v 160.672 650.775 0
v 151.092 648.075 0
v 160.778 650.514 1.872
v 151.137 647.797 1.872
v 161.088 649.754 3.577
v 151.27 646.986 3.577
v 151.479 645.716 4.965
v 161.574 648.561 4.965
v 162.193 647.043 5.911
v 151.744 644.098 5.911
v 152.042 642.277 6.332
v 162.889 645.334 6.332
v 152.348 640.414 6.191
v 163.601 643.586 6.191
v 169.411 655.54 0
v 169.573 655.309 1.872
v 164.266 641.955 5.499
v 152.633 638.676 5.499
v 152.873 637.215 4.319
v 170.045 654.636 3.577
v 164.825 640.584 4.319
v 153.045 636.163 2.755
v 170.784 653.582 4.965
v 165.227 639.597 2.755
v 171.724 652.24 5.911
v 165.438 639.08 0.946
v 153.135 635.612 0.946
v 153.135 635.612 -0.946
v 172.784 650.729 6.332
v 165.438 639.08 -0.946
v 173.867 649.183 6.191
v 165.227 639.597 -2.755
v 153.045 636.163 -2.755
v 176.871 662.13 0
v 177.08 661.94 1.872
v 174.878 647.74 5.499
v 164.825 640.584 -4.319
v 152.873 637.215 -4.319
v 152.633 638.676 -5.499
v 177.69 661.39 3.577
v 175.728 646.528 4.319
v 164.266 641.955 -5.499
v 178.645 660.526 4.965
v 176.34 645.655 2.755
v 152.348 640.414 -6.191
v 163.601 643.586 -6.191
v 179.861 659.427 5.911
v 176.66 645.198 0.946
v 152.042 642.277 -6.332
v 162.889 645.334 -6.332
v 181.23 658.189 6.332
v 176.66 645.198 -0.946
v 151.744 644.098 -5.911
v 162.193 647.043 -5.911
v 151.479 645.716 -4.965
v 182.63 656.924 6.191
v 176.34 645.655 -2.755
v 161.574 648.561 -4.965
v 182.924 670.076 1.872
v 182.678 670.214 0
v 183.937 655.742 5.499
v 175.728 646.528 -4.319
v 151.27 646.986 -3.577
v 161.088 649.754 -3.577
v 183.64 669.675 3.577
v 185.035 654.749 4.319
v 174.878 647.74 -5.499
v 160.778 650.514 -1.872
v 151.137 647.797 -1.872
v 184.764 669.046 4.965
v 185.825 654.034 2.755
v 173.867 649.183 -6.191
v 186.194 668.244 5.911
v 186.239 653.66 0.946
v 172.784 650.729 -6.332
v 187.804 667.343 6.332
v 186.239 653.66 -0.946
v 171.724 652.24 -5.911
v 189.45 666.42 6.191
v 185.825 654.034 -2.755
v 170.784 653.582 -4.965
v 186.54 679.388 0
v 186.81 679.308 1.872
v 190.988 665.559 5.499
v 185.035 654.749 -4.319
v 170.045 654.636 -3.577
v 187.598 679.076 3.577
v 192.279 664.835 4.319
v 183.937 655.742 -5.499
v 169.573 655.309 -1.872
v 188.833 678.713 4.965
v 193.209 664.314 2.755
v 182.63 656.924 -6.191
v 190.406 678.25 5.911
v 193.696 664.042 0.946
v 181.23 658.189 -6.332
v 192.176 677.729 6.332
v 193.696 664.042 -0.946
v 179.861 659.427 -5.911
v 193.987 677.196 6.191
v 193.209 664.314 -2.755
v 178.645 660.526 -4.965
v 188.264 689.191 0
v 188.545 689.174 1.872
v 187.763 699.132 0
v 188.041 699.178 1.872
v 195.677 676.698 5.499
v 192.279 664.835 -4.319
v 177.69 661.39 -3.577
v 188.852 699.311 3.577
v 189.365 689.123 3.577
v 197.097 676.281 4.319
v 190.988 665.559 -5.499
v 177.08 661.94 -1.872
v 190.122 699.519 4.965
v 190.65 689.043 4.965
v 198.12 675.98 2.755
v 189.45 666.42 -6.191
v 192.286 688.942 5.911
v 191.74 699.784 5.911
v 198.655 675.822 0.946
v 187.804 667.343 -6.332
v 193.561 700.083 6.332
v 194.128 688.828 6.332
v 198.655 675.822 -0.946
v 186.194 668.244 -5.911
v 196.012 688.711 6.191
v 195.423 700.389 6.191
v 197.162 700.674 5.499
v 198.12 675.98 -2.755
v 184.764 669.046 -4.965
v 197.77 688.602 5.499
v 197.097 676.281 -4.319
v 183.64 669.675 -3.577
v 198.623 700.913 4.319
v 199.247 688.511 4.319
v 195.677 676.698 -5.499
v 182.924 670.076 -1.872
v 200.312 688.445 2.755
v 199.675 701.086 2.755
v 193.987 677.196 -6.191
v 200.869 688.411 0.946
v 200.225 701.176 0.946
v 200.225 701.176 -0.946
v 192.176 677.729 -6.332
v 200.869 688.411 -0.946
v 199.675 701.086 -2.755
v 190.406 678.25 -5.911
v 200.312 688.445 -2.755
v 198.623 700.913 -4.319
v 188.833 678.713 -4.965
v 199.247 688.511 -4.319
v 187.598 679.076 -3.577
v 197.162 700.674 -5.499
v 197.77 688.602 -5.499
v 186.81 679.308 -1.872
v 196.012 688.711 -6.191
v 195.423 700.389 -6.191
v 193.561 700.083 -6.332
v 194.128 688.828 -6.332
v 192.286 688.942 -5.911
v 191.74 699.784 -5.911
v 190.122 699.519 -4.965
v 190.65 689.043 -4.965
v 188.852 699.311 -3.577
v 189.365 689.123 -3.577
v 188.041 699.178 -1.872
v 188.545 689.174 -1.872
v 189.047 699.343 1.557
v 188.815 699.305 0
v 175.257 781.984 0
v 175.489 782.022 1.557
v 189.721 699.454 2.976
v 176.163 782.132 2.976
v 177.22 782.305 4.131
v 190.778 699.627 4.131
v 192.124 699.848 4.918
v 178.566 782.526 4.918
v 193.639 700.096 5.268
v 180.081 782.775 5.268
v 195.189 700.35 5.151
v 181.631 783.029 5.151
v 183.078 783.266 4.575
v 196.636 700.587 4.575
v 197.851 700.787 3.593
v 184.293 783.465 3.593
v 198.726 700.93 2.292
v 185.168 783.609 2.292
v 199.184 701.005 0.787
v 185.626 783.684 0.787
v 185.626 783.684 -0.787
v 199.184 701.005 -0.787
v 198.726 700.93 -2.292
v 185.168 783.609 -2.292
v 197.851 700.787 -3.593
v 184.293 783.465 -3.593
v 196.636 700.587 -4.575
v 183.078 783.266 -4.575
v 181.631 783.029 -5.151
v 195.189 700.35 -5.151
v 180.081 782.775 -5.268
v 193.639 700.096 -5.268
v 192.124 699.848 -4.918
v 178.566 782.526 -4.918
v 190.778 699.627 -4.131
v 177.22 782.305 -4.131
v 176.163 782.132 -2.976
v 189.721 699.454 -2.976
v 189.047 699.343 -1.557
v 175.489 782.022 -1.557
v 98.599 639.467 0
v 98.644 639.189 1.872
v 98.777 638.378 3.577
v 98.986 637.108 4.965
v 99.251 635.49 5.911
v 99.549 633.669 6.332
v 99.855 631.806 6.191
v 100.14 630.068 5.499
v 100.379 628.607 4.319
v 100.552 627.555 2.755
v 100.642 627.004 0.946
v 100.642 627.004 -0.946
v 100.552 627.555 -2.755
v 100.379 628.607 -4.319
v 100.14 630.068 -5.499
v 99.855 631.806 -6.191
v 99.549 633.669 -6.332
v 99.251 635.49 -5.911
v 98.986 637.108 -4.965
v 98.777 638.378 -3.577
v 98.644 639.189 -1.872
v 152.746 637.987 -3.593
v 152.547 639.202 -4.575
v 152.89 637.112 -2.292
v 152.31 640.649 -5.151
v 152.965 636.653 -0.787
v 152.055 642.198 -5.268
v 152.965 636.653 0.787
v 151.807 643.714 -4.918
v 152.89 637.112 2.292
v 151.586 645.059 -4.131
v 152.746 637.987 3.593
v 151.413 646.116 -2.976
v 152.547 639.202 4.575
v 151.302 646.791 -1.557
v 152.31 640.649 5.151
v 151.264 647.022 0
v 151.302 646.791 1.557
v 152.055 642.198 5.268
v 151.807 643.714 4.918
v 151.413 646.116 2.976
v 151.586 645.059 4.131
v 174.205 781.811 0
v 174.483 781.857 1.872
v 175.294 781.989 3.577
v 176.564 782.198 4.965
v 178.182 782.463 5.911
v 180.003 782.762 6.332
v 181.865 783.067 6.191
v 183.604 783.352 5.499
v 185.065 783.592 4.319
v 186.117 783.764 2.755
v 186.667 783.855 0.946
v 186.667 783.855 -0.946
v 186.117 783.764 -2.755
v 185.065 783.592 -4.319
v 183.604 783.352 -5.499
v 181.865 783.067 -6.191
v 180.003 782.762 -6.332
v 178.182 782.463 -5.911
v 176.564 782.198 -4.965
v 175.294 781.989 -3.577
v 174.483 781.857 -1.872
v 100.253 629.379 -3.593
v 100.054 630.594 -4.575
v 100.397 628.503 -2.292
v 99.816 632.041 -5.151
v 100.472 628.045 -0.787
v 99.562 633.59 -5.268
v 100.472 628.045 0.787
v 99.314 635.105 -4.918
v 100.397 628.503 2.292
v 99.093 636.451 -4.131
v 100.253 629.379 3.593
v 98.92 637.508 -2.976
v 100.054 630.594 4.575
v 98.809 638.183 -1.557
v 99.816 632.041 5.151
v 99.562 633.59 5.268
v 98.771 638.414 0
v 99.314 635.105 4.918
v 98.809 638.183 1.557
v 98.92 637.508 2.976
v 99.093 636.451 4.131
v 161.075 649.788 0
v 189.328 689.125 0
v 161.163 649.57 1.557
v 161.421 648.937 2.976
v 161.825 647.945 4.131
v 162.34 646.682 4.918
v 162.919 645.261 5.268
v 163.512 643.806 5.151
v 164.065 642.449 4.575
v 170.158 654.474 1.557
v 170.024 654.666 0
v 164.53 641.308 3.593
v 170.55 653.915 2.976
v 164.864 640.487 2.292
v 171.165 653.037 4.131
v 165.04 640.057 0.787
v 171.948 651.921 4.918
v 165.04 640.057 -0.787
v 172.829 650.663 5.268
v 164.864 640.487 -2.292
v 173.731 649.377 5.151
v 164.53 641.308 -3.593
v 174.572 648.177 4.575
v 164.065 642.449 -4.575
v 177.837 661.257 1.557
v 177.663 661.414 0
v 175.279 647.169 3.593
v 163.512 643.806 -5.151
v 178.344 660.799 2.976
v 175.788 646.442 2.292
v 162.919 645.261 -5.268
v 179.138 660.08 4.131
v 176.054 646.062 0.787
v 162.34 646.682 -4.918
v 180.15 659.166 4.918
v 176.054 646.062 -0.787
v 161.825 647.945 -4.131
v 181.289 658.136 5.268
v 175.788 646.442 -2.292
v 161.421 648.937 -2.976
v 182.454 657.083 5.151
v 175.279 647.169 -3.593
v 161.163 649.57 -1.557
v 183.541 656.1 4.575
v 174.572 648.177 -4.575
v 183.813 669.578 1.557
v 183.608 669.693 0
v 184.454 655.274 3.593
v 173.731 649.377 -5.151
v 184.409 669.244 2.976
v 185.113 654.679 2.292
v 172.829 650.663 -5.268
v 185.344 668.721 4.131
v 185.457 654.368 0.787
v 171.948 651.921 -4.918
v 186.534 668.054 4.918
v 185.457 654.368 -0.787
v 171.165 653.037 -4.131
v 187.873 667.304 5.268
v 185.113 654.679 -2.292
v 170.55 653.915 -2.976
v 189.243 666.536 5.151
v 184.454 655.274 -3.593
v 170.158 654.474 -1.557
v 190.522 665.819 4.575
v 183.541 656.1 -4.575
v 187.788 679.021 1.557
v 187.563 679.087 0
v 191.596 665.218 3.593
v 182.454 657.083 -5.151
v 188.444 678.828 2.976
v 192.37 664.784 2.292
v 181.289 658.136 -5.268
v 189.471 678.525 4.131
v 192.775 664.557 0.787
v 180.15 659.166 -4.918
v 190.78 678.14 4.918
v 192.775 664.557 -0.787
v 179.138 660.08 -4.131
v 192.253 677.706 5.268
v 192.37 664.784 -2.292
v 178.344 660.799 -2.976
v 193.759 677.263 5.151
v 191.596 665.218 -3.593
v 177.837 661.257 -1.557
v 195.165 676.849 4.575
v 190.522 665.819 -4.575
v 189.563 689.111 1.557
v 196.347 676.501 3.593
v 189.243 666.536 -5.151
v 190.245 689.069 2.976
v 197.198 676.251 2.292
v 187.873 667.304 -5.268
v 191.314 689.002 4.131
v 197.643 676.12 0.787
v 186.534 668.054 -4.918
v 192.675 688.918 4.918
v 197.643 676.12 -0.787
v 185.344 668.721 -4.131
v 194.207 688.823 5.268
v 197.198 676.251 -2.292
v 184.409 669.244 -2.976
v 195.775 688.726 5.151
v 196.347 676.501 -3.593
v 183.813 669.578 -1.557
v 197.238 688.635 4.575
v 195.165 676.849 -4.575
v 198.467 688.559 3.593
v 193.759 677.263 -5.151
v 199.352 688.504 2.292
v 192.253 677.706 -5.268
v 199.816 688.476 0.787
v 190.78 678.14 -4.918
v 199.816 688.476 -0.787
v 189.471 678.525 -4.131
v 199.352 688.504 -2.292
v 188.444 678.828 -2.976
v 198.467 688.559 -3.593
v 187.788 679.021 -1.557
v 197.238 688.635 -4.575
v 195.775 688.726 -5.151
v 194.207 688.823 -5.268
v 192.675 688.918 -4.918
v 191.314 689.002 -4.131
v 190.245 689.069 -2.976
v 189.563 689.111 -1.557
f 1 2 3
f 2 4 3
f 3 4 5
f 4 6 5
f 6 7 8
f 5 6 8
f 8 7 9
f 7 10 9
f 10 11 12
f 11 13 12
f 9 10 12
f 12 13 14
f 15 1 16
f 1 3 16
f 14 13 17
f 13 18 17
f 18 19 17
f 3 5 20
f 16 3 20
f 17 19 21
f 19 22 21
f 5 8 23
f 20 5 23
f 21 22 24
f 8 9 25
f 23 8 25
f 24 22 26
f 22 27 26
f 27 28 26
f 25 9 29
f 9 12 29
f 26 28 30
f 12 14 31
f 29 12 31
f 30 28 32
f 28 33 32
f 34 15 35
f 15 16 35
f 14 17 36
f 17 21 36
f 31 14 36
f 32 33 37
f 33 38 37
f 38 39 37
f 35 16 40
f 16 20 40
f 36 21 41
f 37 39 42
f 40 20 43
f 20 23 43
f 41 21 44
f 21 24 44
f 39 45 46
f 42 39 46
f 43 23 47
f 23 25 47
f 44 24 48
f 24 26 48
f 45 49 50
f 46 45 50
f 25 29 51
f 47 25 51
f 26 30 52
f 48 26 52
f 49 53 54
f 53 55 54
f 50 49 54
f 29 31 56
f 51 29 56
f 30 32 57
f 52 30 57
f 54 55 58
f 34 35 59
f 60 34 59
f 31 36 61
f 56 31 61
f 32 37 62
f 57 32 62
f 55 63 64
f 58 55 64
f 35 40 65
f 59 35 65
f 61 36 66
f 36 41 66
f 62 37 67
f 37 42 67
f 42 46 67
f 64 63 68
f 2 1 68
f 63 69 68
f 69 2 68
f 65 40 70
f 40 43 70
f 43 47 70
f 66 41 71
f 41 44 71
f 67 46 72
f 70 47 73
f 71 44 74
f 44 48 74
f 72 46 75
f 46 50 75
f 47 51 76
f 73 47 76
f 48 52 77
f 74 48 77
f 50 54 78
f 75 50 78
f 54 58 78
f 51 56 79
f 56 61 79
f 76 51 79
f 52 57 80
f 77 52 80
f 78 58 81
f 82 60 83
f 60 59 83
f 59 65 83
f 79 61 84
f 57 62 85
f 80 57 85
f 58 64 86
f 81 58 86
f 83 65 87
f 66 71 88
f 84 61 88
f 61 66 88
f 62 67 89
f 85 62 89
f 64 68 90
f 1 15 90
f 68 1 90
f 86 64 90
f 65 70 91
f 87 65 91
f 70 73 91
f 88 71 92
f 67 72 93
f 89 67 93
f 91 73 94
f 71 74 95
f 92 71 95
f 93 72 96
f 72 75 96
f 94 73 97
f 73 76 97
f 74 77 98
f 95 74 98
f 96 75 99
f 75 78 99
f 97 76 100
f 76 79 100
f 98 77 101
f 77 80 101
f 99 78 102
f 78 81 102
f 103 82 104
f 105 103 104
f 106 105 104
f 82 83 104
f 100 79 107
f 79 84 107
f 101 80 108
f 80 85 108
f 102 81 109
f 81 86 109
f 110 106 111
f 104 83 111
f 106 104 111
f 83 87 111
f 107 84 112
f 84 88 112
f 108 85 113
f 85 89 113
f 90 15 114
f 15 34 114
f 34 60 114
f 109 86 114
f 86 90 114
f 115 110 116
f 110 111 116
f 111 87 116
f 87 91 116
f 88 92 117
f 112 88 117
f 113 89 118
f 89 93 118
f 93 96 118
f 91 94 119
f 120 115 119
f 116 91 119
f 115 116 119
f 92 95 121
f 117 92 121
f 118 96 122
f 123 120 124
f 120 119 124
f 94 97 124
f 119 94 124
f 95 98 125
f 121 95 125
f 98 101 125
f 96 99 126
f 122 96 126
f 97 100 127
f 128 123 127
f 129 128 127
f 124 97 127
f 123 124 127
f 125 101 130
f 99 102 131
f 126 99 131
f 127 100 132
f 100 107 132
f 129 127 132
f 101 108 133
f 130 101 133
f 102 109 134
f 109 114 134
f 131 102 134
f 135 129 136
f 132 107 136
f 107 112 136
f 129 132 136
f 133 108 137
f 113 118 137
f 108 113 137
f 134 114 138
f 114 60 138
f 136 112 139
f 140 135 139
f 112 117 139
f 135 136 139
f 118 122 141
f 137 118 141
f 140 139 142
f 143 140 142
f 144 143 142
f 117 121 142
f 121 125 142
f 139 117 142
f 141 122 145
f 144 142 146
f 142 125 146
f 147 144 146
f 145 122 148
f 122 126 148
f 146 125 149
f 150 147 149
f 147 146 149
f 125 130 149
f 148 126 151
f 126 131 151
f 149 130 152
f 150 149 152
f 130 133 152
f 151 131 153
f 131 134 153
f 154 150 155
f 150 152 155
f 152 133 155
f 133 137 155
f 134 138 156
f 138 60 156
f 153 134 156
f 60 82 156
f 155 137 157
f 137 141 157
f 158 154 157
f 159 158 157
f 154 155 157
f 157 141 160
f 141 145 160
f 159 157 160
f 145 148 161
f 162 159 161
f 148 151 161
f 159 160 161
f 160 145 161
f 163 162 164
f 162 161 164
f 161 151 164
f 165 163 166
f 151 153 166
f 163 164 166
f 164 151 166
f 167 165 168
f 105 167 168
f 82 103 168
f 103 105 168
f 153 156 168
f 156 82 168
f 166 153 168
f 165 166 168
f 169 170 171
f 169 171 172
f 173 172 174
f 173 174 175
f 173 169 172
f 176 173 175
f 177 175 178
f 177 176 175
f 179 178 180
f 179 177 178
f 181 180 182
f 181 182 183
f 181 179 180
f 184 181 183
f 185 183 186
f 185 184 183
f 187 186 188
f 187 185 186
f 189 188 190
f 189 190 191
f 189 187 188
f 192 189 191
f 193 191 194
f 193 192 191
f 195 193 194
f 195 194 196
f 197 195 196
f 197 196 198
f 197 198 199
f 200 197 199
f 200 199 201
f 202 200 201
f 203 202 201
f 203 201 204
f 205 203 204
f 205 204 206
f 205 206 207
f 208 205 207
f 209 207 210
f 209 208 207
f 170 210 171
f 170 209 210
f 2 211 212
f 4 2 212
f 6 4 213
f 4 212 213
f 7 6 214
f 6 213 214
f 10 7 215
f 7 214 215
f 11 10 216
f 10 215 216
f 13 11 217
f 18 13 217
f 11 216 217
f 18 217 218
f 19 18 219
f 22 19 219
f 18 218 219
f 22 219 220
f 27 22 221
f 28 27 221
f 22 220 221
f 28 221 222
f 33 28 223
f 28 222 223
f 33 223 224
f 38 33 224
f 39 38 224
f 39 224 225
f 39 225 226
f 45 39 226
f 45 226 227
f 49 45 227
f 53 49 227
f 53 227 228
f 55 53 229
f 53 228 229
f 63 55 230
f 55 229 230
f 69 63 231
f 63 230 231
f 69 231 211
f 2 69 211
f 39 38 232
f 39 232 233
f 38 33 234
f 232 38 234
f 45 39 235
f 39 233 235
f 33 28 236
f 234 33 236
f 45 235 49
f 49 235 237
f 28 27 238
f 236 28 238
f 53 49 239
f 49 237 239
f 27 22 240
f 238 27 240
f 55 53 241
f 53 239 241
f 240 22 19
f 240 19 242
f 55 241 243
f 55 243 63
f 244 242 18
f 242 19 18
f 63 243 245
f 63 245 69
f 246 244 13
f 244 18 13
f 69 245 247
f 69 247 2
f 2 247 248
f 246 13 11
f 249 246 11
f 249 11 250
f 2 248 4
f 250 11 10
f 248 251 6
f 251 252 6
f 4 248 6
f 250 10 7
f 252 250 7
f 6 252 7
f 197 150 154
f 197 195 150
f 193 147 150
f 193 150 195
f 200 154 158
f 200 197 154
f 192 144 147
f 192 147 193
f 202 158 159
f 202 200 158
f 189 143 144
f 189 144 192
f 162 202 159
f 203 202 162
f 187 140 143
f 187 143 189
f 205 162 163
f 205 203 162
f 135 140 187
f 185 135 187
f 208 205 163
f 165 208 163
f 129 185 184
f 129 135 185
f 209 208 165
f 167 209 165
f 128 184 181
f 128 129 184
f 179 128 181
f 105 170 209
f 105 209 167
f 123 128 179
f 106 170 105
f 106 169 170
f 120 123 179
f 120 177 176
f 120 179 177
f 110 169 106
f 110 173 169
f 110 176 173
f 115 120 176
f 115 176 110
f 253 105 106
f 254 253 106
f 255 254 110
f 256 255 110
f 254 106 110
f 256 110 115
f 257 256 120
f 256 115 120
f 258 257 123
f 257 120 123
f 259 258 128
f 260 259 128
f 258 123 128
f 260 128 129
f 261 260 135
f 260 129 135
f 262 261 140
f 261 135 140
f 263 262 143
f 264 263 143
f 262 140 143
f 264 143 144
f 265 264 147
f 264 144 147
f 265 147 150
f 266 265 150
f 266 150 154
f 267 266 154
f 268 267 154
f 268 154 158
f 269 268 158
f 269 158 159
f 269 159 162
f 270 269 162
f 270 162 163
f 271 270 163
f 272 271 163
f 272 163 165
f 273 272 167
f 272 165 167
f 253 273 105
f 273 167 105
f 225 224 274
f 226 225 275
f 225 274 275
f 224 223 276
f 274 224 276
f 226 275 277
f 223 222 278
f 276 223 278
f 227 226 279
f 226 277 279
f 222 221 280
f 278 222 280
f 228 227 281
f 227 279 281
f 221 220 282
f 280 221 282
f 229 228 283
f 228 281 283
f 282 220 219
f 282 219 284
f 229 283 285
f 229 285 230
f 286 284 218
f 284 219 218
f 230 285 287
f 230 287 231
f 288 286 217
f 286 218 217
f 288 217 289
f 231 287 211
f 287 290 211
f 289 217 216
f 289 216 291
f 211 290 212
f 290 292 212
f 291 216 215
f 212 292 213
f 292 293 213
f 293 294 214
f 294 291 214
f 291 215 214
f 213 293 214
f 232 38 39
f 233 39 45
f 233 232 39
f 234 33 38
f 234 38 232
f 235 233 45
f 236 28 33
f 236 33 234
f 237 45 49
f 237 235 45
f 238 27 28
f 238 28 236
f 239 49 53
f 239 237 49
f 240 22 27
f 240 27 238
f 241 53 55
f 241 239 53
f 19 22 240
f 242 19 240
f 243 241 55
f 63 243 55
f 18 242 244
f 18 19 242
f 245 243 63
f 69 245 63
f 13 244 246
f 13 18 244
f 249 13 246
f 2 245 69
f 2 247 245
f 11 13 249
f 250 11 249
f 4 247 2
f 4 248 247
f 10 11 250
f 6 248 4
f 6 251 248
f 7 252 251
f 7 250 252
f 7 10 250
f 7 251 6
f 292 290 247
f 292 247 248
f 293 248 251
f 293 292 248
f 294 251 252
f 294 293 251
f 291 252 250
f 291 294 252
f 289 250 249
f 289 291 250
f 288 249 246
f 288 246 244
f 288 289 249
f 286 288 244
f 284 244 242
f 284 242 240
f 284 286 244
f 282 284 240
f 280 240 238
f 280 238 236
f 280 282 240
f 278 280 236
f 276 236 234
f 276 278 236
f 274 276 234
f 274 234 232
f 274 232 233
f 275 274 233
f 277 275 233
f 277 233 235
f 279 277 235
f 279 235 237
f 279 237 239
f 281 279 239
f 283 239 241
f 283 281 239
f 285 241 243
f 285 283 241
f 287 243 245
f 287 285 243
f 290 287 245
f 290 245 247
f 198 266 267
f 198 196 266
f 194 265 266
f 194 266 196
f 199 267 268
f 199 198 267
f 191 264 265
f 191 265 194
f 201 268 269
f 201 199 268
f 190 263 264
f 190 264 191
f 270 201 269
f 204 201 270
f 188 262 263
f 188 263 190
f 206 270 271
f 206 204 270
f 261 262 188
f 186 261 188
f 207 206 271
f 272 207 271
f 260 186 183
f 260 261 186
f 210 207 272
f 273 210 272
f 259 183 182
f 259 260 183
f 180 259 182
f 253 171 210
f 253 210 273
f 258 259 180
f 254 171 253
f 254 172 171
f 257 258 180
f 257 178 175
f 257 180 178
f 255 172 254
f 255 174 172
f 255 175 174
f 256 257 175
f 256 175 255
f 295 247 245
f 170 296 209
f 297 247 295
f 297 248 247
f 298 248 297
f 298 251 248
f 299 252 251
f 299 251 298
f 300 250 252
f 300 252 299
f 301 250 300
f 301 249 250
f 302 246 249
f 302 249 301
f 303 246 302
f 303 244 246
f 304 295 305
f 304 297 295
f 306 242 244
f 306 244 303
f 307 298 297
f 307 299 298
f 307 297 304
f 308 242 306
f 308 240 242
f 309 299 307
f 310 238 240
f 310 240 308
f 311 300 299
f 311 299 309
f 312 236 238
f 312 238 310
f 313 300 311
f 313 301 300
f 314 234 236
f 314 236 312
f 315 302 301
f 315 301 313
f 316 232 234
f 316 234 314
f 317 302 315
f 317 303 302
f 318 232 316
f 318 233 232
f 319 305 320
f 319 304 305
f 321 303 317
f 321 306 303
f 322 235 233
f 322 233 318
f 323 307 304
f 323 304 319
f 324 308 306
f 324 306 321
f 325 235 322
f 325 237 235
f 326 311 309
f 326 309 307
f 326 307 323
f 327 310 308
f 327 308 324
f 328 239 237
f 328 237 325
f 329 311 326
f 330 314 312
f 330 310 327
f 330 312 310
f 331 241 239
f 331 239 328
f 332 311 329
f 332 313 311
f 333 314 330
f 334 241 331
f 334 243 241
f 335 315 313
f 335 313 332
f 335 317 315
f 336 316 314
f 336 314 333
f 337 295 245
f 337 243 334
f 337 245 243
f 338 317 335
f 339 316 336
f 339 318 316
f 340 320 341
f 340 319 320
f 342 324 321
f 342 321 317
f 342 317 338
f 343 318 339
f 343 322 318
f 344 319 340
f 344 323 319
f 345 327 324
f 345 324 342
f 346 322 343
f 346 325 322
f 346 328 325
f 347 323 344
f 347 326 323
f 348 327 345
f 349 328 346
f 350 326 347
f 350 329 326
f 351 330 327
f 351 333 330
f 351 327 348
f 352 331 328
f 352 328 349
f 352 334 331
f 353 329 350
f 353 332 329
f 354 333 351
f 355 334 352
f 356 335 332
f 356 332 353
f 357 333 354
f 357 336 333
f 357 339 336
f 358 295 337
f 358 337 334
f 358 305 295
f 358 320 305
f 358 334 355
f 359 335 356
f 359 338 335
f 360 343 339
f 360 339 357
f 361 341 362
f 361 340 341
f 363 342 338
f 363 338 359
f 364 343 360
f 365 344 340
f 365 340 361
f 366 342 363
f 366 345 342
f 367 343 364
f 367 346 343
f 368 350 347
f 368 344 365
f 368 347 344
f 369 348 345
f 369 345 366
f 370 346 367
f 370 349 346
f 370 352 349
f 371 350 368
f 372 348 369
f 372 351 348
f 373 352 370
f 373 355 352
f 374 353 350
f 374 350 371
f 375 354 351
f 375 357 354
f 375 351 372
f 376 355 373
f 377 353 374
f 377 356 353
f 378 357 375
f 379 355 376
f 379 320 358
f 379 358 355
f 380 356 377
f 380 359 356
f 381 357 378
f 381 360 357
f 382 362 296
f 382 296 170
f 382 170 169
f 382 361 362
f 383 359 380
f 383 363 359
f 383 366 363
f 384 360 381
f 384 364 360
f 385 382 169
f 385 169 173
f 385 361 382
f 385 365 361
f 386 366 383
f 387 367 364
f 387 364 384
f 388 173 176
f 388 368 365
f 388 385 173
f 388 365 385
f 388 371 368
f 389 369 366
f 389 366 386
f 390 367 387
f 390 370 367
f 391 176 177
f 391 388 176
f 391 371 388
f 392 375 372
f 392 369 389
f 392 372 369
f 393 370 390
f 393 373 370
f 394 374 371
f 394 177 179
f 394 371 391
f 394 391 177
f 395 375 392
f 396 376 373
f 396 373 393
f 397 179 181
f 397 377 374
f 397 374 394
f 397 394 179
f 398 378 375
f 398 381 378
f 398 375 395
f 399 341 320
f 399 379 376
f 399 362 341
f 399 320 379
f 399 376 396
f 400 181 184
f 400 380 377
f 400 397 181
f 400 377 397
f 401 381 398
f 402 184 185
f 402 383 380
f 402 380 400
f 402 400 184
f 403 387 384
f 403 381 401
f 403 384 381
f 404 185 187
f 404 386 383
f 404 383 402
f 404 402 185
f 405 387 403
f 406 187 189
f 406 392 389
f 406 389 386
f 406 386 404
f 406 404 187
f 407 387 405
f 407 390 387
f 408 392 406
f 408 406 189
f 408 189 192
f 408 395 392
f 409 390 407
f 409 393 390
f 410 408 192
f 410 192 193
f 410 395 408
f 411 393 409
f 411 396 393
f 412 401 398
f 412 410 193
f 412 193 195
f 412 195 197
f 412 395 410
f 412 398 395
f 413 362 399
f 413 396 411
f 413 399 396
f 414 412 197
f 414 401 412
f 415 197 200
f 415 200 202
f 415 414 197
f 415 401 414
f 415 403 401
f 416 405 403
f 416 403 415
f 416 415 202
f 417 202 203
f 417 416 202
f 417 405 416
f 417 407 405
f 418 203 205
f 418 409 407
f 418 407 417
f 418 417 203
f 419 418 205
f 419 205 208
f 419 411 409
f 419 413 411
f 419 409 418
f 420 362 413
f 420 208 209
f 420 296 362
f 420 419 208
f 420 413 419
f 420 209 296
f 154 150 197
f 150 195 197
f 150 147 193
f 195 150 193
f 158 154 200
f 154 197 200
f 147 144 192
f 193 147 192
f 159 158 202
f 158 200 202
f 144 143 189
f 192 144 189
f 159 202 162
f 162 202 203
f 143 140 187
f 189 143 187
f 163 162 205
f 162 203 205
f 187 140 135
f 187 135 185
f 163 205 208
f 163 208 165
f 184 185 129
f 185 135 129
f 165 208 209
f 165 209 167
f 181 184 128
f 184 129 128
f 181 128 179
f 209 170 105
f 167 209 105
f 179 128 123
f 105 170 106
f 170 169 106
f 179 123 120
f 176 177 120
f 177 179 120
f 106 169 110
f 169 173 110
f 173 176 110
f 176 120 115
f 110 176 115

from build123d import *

# Parameters (mm, degrees)
SKETCH11_R                = 6.35
SKETCH11_R_2              = 5.2832
PIPE_0_5_SCH_40_1_DEPTH   = 53.19414965
SKETCH11_ON_SEGMENT_2_R   = 6.35
SKETCH11_ON_SEGMENT_2_R_2 = 5.2832
PIPE_0_5_SCH_40_1_2_ANGLE = 90
SKETCH11_ON_SEGMENT_3_R   = 6.35
SKETCH11_ON_SEGMENT_3_R_2 = 5.2832
PIPE_0_5_SCH_40_1_3_DEPTH = 83.782915117


with BuildPart() as part:
    # Sketch11 → Pipe 0.5 SCH 40(1) (new body)
    with BuildSketch(Plane(origin=(99.62622679, 633.200738698, 0), x_dir=(-0.1618236311412458, 0.9868196959953028, 0), z_dir=(0.986819695995303, 0.16182363114124582, 0))):
        Circle(SKETCH11_R)
        Circle(SKETCH11_R_2, mode=Mode.SUBTRACT)
    extrude(amount=PIPE_0_5_SCH_40_1_DEPTH)


with BuildPart() as body_2:
    # Sketch11 on segment 2 (carried to the start of arc 2) → Pipe 0.5 SCH 40_1 2 (revolve)
    with BuildSketch(Plane(origin=(152.119261376, 641.80880915, 0), x_dir=(-0.161823631, 0.986819696, 0), z_dir=(0.986819696, 0.161823631, 0))):
        Circle(SKETCH11_ON_SEGMENT_2_R)
        Circle(SKETCH11_ON_SEGMENT_2_R_2, mode=Mode.SUBTRACT)
    revolve(axis=Axis((143.898620914, 691.939249707, 0), (0, 0, 1)), revolution_arc=PIPE_0_5_SCH_40_1_2_ANGLE)


with BuildPart() as body_3:
    # Sketch11 on segment 3 (carried to segment 3) → Pipe 0.5 SCH 40_1 3 (new body)
    with BuildSketch(Plane(origin=(194.02906147, 700.159890169, 0), x_dir=(-0.986819696, -0.161823631, 0), z_dir=(-0.161823631, 0.986819696, 0))):
        Circle(SKETCH11_ON_SEGMENT_3_R)
        Circle(SKETCH11_ON_SEGMENT_3_R_2, mode=Mode.SUBTRACT)
    extrude(amount=PIPE_0_5_SCH_40_1_3_DEPTH)


solid = Compound([part.part, body_2.part, body_3.part])
